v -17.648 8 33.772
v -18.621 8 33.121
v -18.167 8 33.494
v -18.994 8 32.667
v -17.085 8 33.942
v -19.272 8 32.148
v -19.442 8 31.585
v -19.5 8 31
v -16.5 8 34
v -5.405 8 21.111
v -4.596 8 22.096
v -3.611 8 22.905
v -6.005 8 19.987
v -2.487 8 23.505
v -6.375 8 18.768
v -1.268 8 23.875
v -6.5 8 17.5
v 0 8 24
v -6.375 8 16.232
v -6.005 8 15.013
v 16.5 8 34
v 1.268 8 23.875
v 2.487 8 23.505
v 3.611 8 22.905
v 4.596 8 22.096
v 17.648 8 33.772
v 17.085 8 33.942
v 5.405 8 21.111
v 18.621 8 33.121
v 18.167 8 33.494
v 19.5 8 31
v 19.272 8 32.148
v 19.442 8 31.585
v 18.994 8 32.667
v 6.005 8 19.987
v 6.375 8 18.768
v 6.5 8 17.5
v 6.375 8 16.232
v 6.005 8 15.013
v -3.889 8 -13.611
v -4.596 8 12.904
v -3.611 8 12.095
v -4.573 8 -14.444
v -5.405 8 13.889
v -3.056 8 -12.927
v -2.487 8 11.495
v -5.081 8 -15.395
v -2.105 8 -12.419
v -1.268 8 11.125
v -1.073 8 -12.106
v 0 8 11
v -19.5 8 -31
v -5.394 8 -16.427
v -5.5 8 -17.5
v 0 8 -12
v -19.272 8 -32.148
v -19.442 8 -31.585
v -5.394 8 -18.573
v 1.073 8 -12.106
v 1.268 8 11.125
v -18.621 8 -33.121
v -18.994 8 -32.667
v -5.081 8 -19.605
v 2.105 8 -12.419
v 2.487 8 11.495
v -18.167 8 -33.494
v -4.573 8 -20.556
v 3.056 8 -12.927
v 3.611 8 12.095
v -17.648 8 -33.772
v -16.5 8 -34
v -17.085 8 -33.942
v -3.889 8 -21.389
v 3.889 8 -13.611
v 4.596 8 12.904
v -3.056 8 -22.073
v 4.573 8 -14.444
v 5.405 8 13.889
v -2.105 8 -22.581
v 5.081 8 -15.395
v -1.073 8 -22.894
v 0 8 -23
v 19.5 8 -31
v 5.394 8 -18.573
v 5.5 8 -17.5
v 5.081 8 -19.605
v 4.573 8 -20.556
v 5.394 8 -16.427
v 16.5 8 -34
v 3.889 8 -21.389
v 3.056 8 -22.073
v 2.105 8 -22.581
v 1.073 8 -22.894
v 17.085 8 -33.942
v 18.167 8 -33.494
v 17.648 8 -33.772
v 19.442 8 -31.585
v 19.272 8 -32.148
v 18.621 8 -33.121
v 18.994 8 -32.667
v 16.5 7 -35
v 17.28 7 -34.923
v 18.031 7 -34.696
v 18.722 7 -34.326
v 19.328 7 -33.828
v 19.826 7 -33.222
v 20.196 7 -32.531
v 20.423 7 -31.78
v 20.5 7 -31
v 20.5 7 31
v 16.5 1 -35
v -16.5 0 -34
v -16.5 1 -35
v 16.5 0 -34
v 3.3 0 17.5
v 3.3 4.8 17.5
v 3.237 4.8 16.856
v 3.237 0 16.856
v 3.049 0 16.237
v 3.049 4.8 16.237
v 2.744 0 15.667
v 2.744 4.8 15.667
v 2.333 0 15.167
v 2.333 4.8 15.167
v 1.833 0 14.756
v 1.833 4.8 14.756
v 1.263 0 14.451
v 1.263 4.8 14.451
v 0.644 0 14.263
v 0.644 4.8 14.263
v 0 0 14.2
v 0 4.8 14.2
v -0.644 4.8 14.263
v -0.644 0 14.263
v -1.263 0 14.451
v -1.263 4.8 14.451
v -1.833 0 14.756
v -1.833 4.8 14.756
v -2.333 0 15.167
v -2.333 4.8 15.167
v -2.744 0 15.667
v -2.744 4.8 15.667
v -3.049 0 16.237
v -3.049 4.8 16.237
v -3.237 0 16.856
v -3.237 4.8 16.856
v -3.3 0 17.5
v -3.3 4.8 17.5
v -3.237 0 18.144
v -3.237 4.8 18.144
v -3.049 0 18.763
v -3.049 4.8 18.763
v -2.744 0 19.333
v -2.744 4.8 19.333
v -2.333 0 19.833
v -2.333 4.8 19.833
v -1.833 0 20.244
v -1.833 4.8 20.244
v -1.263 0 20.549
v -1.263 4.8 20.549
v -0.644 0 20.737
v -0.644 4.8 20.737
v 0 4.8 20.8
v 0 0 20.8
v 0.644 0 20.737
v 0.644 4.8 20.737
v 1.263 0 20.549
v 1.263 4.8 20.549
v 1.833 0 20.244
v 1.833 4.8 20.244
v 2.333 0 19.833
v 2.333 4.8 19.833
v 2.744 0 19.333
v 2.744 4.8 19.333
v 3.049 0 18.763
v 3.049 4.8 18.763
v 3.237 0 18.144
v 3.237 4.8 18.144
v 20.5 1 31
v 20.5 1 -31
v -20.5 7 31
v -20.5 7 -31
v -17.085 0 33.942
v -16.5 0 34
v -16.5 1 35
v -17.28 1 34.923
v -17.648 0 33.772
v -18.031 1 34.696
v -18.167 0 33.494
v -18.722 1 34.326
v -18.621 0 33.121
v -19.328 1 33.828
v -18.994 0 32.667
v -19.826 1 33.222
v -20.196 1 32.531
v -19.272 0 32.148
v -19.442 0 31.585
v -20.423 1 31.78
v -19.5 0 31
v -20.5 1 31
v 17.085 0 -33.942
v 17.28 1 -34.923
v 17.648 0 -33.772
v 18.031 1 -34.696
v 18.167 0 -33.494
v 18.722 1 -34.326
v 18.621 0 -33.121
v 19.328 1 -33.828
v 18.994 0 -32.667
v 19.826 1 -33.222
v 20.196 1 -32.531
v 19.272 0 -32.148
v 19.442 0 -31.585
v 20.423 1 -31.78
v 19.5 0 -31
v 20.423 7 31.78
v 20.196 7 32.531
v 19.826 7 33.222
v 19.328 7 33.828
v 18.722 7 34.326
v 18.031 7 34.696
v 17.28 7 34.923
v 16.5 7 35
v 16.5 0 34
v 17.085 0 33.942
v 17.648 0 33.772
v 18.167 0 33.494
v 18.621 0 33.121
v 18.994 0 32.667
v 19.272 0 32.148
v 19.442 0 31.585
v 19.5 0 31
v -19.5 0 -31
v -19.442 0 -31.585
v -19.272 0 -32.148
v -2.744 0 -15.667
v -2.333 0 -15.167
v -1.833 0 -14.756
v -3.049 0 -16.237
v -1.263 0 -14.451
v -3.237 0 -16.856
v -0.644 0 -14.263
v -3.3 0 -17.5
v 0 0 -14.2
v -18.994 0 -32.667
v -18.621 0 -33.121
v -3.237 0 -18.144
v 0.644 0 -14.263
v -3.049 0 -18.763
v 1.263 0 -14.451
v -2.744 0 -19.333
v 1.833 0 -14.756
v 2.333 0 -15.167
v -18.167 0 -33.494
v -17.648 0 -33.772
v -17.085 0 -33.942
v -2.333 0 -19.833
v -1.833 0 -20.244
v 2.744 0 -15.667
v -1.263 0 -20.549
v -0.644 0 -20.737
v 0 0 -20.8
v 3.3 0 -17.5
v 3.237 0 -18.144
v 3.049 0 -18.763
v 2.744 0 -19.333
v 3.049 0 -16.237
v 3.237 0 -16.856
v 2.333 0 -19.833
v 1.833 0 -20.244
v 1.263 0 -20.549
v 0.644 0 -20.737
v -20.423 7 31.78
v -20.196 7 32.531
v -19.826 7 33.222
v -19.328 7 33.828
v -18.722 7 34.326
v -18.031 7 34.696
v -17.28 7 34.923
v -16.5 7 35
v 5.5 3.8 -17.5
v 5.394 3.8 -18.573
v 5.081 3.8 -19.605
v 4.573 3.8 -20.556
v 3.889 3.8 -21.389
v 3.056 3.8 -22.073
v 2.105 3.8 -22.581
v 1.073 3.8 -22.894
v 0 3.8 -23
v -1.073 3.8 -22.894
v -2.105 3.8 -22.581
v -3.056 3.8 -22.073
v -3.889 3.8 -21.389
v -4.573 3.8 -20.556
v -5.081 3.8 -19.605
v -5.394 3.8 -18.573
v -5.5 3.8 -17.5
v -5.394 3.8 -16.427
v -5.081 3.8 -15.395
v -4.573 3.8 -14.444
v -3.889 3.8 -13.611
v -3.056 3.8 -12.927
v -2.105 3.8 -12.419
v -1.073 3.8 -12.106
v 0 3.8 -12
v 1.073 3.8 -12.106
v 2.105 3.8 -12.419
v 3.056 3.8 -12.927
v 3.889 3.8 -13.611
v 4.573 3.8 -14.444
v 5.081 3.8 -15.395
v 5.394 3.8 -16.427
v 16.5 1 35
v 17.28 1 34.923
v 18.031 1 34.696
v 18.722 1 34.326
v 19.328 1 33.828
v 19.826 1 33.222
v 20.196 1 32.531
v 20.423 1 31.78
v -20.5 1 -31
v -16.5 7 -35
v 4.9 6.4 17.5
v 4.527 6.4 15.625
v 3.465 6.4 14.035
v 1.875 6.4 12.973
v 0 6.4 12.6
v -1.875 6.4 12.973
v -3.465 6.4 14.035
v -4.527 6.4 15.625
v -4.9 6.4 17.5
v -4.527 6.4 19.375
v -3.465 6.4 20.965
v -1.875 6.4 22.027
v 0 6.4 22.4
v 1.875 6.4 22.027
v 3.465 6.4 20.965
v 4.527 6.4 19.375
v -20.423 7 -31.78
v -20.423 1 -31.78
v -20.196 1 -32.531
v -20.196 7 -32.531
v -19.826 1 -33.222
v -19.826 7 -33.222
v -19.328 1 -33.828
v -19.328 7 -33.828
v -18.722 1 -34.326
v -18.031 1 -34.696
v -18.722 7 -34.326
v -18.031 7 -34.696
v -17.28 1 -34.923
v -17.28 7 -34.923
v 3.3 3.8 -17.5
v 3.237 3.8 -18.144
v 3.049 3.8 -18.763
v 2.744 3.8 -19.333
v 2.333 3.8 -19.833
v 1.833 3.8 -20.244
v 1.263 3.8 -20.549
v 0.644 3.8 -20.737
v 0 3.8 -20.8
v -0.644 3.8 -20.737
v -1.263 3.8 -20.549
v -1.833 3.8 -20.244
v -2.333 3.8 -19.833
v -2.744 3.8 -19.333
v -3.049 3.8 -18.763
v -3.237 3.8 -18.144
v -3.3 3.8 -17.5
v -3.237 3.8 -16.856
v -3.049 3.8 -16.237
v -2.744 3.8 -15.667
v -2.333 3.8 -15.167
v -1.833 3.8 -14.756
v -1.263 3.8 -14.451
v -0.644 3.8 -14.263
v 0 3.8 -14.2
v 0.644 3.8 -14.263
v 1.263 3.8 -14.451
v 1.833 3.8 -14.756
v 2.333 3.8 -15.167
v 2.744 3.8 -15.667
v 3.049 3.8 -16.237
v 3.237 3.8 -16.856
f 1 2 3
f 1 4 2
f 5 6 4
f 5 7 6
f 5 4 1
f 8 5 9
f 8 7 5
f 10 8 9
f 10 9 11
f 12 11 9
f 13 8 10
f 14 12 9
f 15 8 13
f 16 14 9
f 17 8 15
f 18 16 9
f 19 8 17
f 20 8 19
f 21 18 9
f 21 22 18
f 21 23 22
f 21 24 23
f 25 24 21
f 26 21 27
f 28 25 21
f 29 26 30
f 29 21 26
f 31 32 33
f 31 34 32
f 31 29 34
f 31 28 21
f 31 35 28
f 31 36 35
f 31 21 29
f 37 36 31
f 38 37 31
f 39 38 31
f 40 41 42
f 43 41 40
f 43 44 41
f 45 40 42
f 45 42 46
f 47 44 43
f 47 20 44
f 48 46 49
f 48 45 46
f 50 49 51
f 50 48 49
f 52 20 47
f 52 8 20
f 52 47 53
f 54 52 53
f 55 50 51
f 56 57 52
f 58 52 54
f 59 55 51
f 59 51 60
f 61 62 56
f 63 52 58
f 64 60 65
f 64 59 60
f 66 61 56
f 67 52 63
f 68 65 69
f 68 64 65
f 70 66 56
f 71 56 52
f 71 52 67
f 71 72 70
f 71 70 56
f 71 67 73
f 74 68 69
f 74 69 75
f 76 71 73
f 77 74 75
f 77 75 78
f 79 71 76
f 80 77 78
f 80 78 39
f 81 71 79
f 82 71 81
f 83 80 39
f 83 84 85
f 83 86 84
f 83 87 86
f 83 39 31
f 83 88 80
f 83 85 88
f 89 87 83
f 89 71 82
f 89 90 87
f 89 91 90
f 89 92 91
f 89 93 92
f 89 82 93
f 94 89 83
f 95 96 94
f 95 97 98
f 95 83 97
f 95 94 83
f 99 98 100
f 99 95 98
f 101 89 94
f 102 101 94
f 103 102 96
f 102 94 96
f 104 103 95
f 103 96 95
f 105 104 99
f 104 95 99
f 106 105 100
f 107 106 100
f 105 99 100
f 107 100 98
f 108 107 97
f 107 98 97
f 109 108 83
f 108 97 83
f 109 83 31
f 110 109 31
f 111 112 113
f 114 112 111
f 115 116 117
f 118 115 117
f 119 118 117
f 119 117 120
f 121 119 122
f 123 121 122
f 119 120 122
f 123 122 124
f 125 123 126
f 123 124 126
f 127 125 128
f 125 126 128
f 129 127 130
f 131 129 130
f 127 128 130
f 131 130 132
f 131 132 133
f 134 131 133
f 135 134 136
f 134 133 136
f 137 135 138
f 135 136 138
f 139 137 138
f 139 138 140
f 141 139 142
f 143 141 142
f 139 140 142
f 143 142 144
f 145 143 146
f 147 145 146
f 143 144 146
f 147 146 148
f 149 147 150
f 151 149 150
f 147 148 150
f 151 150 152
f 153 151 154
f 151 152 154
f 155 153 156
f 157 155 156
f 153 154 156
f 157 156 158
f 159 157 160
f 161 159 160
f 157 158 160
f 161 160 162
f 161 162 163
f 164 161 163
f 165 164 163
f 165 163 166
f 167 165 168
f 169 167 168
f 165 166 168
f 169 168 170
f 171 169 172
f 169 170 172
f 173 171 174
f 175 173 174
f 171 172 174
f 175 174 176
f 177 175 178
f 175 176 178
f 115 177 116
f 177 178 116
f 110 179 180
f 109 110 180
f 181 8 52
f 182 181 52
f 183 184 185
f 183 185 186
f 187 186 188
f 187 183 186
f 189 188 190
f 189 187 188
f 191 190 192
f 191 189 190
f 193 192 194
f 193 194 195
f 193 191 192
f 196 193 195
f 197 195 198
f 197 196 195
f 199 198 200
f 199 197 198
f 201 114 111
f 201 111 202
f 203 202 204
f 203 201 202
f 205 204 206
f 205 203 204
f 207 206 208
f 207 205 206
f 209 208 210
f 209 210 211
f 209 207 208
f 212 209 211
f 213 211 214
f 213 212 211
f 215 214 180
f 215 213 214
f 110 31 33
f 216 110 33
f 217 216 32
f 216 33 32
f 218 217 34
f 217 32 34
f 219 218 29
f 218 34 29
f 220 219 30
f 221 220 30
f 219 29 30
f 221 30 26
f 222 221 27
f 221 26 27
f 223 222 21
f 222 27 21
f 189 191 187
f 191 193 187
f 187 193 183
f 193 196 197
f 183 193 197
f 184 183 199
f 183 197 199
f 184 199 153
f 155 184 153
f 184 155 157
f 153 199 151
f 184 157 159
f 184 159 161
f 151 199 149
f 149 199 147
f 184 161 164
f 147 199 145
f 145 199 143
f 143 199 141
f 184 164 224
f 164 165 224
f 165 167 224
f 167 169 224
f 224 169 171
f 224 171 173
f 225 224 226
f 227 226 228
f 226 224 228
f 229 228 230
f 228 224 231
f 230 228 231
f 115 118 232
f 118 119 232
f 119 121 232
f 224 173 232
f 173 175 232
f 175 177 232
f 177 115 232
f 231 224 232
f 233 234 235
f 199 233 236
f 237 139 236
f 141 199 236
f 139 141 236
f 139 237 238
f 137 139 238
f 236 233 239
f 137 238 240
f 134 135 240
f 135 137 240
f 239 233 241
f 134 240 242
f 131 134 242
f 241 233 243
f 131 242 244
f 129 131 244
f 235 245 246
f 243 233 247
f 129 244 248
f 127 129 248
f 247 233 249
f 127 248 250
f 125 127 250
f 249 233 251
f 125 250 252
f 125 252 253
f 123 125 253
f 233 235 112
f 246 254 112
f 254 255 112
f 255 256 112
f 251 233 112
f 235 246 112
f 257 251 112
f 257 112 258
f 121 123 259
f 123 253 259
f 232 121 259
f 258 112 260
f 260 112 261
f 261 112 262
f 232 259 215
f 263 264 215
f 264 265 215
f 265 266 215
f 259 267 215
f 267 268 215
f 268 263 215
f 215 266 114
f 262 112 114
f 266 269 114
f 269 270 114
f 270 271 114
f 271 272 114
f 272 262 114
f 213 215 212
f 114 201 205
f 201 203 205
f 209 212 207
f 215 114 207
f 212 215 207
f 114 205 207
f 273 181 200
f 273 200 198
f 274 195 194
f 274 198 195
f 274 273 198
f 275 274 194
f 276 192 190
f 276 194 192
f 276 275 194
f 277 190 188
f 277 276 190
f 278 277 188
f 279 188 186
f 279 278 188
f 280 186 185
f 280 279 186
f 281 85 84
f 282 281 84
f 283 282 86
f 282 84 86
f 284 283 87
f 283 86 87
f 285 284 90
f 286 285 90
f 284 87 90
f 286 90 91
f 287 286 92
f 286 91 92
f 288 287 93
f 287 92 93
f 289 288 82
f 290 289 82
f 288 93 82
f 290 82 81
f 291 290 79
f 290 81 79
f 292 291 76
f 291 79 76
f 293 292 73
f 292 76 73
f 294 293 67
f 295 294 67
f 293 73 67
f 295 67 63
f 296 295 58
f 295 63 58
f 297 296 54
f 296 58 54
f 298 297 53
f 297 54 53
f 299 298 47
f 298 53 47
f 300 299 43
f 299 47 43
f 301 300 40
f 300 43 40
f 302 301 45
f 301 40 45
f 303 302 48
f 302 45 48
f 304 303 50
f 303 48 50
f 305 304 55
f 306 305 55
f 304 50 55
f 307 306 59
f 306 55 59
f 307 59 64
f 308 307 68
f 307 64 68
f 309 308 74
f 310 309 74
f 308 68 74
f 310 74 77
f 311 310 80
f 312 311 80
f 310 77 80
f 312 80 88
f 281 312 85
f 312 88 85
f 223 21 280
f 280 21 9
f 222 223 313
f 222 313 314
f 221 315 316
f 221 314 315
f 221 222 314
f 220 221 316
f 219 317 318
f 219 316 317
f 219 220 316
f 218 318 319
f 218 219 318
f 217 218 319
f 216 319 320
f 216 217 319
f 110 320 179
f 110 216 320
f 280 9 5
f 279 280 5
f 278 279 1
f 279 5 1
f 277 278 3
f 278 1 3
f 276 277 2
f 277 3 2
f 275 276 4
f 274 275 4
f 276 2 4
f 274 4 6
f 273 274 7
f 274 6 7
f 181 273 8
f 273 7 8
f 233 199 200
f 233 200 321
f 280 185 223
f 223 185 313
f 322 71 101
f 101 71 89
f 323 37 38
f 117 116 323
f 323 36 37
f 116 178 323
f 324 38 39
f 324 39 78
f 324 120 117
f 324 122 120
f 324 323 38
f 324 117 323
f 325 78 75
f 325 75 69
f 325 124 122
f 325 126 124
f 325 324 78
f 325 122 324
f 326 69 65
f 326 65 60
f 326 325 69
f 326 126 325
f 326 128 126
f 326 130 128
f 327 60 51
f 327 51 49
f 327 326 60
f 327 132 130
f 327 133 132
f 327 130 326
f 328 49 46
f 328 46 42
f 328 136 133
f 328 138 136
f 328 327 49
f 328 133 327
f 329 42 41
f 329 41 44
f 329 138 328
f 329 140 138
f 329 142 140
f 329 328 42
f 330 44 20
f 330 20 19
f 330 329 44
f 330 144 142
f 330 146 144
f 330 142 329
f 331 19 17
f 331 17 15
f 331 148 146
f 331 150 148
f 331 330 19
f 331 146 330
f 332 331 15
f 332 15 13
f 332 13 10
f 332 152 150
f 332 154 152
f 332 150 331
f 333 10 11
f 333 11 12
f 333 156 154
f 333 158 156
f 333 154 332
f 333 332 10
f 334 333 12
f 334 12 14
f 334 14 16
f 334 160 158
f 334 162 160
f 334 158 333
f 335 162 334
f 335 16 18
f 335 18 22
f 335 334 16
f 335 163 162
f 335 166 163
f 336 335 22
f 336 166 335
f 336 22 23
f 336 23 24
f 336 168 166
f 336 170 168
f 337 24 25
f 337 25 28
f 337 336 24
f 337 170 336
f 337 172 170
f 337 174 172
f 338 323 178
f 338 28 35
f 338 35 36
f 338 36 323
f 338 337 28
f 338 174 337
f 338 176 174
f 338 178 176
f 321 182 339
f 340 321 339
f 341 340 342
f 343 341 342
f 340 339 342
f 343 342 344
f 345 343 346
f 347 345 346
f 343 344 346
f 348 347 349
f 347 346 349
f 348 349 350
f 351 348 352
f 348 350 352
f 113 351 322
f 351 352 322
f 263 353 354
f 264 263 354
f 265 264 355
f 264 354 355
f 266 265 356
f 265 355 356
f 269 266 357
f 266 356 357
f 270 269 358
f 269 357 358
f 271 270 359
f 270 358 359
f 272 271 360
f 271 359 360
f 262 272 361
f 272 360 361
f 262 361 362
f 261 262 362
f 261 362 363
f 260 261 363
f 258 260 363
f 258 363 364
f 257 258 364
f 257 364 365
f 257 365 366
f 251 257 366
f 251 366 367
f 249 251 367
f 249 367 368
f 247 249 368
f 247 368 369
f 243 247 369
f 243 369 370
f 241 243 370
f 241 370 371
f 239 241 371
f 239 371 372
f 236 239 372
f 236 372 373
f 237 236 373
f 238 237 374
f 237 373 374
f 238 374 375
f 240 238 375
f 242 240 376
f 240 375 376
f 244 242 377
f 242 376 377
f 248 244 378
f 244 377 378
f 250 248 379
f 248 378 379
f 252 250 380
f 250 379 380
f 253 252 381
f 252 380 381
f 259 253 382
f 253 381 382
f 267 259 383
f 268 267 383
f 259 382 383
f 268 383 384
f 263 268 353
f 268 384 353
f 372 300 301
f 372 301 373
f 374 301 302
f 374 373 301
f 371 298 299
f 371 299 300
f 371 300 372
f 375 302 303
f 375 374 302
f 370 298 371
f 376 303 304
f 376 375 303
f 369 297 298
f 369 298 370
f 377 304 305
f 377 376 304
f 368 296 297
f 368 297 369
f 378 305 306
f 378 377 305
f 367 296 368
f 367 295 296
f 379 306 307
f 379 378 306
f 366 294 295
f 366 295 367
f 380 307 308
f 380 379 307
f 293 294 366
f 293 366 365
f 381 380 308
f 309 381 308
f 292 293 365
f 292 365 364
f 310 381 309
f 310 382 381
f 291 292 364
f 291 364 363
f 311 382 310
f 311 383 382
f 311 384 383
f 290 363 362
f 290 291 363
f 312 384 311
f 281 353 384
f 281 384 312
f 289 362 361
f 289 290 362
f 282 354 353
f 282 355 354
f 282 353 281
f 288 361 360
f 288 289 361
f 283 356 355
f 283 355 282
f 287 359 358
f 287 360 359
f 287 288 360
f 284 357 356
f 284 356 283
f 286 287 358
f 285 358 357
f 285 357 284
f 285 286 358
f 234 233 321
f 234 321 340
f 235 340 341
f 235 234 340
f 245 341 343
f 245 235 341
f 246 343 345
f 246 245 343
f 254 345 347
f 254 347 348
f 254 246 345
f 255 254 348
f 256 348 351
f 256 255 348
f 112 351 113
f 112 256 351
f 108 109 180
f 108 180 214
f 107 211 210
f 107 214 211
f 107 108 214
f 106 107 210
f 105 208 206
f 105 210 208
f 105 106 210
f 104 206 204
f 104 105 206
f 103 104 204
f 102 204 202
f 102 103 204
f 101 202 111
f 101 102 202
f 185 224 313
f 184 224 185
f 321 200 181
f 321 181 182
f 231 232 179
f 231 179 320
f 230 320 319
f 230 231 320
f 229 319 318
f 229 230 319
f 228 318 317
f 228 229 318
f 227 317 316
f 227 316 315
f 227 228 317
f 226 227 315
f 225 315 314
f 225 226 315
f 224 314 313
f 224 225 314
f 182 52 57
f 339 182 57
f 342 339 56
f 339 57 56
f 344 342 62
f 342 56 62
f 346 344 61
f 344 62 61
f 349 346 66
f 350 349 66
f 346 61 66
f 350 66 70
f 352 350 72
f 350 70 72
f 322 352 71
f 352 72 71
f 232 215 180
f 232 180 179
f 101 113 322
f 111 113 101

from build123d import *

# Parameters (mm, degrees)
SKETCH1_W           = 41
SKETCH1_H           = 70
BOSS_EXTRUDE1_DEPTH = 8
FILLET1_R           = 4
CHAMFER1_SIZE       = 1
SKETCH2_R           = 3.3
CUT_EXTRUDE1_DEPTH  = 8
CHAMFER2_SIZE       = 3.2
SKETCH3_R           = 5.5
CUT_EXTRUDE2_DEPTH  = 4.2
SKETCH4_R           = 5.1
CUT_EXTRUDE3_DEPTH  = 10
SKETCH5_R           = 10
CUT_EXTRUDE5_DEPTH  = 4
SKETCH6_R           = 10
BOSS_EXTRUDE2_DEPTH = 8


with BuildPart() as part:
    # Sketch1 → Boss-Extrude1 (new body)
    with BuildSketch(Plane(origin=(0, 0, 0), x_dir=(1, 0, 0), z_dir=(0, 1, 0))):
        Rectangle(SKETCH1_W, SKETCH1_H)
    extrude(amount=BOSS_EXTRUDE1_DEPTH)

    # Fillet1
    fillet1_edges = [part.edges().sort_by_distance(p)[0] for p in [
        (20.5, 4, 35),
        (-20.5, 4, 35),
        (-20.5, 4, -35),
        (20.5, 4, -35),
    ]]
    fillet(fillet1_edges, radius=FILLET1_R)

    # Chamfer1
    chamfer1_edges = [part.edges().sort_by_distance(p)[0] for p in [
        (-20.5, 0, 0),
        (-20.5, 8, 0),
        (20.5, 0, 0),
        (0, 0, 35),
        (0, 0, -35),
        (-19.328427125, 0, 33.828427125),
        (19.328427125, 0, 33.828427125),
        (19.328427125, 0, -33.828427125),
        (-19.328427125, 0, -33.828427125),
        (0, 8, -35),
        (20.5, 8, 0),
        (0, 8, 35),
        (-19.328427125, 8, 33.828427125),
        (19.328427125, 8, 33.828427125),
        (19.328427125, 8, -33.828427125),
        (-19.328427125, 8, -33.828427125),
    ]]
    chamfer(chamfer1_edges, length=CHAMFER1_SIZE)

    # Sketch2 → Cut-Extrude1 (cut)
    with BuildSketch(Plane(origin=(0, 8, 0), x_dir=(1, 0, 0), z_dir=(0, 1, 0))):
        with Locations((0, -17.5)):
            Circle(SKETCH2_R)
        with Locations((0, 17.5)):
            Circle(SKETCH2_R)
    extrude(amount=-CUT_EXTRUDE1_DEPTH, mode=Mode.SUBTRACT)

    # Chamfer2
    chamfer2_edges = [part.edges().sort_by_distance(p)[0] for p in [
        (-3.3, 8, 17.5),
    ]]
    chamfer(chamfer2_edges, length=CHAMFER2_SIZE)

    # Sketch3 → Cut-Extrude2 (cut)
    with BuildSketch(Plane(origin=(0, 8, 0), x_dir=(1, 0, 0), z_dir=(0, 1, 0))):
        with Locations((0, 17.5)):
            Circle(SKETCH3_R)
    extrude(amount=-CUT_EXTRUDE2_DEPTH, mode=Mode.SUBTRACT)

    # Sketch4 → Cut-Extrude3 (cut)
    with BuildSketch(Plane(origin=(0, 8, 0), x_dir=(1, 0, 0), z_dir=(0, 1, 0))):
        Circle(SKETCH4_R)
    extrude(amount=-CUT_EXTRUDE3_DEPTH, mode=Mode.SUBTRACT)

    # Sketch5 → Cut-Extrude5 (cut)
    with BuildSketch(Plane(origin=(0, 8, 0), x_dir=(1, 0, 0), z_dir=(0, 1, 0))):
        Circle(SKETCH5_R)
    extrude(amount=-CUT_EXTRUDE5_DEPTH, mode=Mode.SUBTRACT)

    # Sketch6 → Boss-Extrude2 (add)
    with BuildSketch(Plane(origin=(0, 8, 0), x_dir=(1, 0, 0), z_dir=(0, 1, 0))):
        Circle(SKETCH6_R)
    extrude(amount=-BOSS_EXTRUDE2_DEPTH)


solid = part.part
